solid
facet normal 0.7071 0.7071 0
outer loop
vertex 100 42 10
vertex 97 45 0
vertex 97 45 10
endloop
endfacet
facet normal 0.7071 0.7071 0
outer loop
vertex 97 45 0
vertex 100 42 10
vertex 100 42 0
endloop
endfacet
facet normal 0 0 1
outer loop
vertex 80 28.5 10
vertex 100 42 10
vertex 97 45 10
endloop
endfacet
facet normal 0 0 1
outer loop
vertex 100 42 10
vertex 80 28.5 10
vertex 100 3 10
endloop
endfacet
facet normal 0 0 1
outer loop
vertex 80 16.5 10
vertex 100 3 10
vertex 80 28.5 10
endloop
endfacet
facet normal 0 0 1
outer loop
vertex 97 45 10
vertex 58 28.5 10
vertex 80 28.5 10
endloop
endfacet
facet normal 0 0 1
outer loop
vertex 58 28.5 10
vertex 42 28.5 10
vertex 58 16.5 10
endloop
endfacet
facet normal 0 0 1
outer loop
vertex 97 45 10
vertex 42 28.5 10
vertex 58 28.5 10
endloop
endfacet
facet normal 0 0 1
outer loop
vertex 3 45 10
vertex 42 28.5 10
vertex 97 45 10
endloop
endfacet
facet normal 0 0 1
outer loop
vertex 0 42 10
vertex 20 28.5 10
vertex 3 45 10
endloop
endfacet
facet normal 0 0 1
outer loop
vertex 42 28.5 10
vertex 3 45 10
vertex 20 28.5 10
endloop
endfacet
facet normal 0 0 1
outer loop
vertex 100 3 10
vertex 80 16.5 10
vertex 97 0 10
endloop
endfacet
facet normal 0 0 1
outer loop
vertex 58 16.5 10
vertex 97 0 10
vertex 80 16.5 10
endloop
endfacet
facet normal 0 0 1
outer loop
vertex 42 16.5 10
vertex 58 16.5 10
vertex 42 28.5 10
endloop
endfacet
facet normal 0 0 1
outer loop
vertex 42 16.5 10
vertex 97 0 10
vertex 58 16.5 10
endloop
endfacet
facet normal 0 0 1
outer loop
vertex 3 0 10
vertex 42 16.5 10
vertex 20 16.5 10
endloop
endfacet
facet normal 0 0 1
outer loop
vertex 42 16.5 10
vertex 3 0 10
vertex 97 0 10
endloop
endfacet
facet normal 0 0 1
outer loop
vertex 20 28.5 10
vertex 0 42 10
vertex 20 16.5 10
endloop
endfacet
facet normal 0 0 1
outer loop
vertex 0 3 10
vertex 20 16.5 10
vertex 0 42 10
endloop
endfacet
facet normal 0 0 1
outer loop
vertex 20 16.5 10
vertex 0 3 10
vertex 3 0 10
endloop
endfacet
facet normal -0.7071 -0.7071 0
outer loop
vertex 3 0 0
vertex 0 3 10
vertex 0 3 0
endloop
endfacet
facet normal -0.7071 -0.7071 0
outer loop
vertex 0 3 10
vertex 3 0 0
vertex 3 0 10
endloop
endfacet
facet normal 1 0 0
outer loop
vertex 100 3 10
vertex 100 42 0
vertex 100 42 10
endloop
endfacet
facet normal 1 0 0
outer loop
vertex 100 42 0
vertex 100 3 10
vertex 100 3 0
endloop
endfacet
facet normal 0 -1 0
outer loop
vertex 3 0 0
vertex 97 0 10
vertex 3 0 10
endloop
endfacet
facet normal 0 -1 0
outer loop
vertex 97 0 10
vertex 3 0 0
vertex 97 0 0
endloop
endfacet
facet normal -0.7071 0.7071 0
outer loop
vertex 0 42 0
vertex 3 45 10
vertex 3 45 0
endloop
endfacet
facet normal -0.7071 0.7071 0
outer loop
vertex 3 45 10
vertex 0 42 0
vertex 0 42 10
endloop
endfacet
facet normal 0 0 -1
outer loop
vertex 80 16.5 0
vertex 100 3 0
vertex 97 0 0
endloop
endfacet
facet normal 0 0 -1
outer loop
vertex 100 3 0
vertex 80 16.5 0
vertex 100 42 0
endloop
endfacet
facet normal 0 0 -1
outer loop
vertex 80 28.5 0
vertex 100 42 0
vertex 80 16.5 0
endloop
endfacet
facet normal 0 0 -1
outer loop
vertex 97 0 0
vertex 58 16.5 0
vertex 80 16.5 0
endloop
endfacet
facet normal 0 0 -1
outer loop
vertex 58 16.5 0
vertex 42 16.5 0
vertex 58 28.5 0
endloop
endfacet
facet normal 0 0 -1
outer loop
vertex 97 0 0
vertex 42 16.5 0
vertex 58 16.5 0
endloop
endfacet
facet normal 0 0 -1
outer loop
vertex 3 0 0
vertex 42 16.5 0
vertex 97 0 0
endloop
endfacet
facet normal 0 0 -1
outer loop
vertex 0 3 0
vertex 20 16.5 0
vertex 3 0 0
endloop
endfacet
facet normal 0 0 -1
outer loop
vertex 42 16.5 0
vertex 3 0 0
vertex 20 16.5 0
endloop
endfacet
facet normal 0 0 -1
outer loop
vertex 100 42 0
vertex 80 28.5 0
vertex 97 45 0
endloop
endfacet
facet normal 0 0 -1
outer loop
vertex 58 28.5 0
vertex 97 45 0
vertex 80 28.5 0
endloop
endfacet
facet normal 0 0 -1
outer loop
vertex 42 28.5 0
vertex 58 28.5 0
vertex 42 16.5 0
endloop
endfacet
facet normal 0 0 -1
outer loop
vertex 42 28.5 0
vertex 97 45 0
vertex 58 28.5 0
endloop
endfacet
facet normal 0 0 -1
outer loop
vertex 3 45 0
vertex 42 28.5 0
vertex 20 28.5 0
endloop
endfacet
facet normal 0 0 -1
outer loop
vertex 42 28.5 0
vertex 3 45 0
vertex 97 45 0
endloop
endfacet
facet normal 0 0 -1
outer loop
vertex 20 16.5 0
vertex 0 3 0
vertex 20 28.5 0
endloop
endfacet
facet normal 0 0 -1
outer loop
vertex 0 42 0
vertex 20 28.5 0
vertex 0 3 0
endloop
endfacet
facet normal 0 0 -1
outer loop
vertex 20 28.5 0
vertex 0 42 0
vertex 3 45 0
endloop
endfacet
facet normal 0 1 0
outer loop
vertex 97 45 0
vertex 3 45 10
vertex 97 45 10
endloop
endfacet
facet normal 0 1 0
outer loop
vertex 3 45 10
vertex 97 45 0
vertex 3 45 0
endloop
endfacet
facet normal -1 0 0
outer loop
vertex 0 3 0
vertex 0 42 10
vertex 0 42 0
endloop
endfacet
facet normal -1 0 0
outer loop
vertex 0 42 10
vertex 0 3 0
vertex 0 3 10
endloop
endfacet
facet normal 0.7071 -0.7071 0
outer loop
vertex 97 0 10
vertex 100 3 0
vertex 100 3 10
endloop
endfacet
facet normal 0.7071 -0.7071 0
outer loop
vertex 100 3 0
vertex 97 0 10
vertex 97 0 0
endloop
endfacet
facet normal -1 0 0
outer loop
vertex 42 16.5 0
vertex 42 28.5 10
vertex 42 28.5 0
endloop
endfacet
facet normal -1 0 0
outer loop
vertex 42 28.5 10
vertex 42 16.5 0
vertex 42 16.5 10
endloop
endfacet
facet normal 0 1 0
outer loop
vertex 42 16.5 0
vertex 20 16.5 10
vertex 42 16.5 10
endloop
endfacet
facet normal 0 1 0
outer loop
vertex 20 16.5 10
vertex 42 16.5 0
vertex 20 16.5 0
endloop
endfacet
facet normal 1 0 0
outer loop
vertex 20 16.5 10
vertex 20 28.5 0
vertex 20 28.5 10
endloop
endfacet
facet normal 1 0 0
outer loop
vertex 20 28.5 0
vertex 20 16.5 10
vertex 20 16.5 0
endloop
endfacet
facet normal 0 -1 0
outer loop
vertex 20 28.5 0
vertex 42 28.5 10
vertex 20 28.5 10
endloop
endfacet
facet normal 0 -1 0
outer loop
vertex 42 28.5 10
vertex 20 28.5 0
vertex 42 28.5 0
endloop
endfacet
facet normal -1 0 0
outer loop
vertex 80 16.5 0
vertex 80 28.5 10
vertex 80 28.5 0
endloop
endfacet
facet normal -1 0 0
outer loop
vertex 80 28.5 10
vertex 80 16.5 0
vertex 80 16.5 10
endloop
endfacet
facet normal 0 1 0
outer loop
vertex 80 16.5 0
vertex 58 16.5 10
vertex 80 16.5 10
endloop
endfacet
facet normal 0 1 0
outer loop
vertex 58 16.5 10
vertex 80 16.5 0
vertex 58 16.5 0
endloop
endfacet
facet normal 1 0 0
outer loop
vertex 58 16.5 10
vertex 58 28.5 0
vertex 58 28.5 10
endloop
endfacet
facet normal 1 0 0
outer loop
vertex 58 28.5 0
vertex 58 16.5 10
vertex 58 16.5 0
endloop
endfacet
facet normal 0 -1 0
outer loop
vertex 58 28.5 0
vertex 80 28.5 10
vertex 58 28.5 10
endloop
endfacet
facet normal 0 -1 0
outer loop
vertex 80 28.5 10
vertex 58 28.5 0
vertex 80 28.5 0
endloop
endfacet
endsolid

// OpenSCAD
$fn = 32;

// ----------------------------------------------------------------------
// Windowed plate: 2 voids, 100 x 45 x 10 mm
// ----------------------------------------------------------------------

// --- parameters (mm) ---
plate_l = 100;            // plate length, X
plate_w = 45;             // plate width, Y
plate_t = 10;             // plate thickness, Z
edge_margin = 12;         // wall from the plate edge to any window
windows = 2;              // number of windows in the row
win_l = 22;               // window length
win_w = 12;               // window width
win_pitch = 38;           // window pitch along X
depth_1 = 10;             // depth of void 1 (full thickness = through)
depth_2 = 10;             // depth of void 2 (full thickness = through)
corner_c = 3;             // corner chamfer of the plate

profile = [[3, 0], [97, 0], [100, 3], [100, 42], [97, 45], [3, 45], [0, 42], [0, 3]];  // primary outline, 8 points, counter clockwise
void_1 = [[20, 16.5], [42, 16.5], [42, 28.5], [20, 28.5]];  // window 1 of the row, 4 points
void_2 = [[58, 16.5], [80, 16.5], [80, 28.5], [58, 28.5]];  // window 2 of the row, 4 points

// --- the one profile operation ---
difference() {
  linear_extrude(height = plate_t) polygon(points = profile);
  translate([0, 0, -1])
    linear_extrude(height = plate_t + 2) polygon(points = void_1);
  translate([0, 0, -1])
    linear_extrude(height = plate_t + 2) polygon(points = void_2);
}
